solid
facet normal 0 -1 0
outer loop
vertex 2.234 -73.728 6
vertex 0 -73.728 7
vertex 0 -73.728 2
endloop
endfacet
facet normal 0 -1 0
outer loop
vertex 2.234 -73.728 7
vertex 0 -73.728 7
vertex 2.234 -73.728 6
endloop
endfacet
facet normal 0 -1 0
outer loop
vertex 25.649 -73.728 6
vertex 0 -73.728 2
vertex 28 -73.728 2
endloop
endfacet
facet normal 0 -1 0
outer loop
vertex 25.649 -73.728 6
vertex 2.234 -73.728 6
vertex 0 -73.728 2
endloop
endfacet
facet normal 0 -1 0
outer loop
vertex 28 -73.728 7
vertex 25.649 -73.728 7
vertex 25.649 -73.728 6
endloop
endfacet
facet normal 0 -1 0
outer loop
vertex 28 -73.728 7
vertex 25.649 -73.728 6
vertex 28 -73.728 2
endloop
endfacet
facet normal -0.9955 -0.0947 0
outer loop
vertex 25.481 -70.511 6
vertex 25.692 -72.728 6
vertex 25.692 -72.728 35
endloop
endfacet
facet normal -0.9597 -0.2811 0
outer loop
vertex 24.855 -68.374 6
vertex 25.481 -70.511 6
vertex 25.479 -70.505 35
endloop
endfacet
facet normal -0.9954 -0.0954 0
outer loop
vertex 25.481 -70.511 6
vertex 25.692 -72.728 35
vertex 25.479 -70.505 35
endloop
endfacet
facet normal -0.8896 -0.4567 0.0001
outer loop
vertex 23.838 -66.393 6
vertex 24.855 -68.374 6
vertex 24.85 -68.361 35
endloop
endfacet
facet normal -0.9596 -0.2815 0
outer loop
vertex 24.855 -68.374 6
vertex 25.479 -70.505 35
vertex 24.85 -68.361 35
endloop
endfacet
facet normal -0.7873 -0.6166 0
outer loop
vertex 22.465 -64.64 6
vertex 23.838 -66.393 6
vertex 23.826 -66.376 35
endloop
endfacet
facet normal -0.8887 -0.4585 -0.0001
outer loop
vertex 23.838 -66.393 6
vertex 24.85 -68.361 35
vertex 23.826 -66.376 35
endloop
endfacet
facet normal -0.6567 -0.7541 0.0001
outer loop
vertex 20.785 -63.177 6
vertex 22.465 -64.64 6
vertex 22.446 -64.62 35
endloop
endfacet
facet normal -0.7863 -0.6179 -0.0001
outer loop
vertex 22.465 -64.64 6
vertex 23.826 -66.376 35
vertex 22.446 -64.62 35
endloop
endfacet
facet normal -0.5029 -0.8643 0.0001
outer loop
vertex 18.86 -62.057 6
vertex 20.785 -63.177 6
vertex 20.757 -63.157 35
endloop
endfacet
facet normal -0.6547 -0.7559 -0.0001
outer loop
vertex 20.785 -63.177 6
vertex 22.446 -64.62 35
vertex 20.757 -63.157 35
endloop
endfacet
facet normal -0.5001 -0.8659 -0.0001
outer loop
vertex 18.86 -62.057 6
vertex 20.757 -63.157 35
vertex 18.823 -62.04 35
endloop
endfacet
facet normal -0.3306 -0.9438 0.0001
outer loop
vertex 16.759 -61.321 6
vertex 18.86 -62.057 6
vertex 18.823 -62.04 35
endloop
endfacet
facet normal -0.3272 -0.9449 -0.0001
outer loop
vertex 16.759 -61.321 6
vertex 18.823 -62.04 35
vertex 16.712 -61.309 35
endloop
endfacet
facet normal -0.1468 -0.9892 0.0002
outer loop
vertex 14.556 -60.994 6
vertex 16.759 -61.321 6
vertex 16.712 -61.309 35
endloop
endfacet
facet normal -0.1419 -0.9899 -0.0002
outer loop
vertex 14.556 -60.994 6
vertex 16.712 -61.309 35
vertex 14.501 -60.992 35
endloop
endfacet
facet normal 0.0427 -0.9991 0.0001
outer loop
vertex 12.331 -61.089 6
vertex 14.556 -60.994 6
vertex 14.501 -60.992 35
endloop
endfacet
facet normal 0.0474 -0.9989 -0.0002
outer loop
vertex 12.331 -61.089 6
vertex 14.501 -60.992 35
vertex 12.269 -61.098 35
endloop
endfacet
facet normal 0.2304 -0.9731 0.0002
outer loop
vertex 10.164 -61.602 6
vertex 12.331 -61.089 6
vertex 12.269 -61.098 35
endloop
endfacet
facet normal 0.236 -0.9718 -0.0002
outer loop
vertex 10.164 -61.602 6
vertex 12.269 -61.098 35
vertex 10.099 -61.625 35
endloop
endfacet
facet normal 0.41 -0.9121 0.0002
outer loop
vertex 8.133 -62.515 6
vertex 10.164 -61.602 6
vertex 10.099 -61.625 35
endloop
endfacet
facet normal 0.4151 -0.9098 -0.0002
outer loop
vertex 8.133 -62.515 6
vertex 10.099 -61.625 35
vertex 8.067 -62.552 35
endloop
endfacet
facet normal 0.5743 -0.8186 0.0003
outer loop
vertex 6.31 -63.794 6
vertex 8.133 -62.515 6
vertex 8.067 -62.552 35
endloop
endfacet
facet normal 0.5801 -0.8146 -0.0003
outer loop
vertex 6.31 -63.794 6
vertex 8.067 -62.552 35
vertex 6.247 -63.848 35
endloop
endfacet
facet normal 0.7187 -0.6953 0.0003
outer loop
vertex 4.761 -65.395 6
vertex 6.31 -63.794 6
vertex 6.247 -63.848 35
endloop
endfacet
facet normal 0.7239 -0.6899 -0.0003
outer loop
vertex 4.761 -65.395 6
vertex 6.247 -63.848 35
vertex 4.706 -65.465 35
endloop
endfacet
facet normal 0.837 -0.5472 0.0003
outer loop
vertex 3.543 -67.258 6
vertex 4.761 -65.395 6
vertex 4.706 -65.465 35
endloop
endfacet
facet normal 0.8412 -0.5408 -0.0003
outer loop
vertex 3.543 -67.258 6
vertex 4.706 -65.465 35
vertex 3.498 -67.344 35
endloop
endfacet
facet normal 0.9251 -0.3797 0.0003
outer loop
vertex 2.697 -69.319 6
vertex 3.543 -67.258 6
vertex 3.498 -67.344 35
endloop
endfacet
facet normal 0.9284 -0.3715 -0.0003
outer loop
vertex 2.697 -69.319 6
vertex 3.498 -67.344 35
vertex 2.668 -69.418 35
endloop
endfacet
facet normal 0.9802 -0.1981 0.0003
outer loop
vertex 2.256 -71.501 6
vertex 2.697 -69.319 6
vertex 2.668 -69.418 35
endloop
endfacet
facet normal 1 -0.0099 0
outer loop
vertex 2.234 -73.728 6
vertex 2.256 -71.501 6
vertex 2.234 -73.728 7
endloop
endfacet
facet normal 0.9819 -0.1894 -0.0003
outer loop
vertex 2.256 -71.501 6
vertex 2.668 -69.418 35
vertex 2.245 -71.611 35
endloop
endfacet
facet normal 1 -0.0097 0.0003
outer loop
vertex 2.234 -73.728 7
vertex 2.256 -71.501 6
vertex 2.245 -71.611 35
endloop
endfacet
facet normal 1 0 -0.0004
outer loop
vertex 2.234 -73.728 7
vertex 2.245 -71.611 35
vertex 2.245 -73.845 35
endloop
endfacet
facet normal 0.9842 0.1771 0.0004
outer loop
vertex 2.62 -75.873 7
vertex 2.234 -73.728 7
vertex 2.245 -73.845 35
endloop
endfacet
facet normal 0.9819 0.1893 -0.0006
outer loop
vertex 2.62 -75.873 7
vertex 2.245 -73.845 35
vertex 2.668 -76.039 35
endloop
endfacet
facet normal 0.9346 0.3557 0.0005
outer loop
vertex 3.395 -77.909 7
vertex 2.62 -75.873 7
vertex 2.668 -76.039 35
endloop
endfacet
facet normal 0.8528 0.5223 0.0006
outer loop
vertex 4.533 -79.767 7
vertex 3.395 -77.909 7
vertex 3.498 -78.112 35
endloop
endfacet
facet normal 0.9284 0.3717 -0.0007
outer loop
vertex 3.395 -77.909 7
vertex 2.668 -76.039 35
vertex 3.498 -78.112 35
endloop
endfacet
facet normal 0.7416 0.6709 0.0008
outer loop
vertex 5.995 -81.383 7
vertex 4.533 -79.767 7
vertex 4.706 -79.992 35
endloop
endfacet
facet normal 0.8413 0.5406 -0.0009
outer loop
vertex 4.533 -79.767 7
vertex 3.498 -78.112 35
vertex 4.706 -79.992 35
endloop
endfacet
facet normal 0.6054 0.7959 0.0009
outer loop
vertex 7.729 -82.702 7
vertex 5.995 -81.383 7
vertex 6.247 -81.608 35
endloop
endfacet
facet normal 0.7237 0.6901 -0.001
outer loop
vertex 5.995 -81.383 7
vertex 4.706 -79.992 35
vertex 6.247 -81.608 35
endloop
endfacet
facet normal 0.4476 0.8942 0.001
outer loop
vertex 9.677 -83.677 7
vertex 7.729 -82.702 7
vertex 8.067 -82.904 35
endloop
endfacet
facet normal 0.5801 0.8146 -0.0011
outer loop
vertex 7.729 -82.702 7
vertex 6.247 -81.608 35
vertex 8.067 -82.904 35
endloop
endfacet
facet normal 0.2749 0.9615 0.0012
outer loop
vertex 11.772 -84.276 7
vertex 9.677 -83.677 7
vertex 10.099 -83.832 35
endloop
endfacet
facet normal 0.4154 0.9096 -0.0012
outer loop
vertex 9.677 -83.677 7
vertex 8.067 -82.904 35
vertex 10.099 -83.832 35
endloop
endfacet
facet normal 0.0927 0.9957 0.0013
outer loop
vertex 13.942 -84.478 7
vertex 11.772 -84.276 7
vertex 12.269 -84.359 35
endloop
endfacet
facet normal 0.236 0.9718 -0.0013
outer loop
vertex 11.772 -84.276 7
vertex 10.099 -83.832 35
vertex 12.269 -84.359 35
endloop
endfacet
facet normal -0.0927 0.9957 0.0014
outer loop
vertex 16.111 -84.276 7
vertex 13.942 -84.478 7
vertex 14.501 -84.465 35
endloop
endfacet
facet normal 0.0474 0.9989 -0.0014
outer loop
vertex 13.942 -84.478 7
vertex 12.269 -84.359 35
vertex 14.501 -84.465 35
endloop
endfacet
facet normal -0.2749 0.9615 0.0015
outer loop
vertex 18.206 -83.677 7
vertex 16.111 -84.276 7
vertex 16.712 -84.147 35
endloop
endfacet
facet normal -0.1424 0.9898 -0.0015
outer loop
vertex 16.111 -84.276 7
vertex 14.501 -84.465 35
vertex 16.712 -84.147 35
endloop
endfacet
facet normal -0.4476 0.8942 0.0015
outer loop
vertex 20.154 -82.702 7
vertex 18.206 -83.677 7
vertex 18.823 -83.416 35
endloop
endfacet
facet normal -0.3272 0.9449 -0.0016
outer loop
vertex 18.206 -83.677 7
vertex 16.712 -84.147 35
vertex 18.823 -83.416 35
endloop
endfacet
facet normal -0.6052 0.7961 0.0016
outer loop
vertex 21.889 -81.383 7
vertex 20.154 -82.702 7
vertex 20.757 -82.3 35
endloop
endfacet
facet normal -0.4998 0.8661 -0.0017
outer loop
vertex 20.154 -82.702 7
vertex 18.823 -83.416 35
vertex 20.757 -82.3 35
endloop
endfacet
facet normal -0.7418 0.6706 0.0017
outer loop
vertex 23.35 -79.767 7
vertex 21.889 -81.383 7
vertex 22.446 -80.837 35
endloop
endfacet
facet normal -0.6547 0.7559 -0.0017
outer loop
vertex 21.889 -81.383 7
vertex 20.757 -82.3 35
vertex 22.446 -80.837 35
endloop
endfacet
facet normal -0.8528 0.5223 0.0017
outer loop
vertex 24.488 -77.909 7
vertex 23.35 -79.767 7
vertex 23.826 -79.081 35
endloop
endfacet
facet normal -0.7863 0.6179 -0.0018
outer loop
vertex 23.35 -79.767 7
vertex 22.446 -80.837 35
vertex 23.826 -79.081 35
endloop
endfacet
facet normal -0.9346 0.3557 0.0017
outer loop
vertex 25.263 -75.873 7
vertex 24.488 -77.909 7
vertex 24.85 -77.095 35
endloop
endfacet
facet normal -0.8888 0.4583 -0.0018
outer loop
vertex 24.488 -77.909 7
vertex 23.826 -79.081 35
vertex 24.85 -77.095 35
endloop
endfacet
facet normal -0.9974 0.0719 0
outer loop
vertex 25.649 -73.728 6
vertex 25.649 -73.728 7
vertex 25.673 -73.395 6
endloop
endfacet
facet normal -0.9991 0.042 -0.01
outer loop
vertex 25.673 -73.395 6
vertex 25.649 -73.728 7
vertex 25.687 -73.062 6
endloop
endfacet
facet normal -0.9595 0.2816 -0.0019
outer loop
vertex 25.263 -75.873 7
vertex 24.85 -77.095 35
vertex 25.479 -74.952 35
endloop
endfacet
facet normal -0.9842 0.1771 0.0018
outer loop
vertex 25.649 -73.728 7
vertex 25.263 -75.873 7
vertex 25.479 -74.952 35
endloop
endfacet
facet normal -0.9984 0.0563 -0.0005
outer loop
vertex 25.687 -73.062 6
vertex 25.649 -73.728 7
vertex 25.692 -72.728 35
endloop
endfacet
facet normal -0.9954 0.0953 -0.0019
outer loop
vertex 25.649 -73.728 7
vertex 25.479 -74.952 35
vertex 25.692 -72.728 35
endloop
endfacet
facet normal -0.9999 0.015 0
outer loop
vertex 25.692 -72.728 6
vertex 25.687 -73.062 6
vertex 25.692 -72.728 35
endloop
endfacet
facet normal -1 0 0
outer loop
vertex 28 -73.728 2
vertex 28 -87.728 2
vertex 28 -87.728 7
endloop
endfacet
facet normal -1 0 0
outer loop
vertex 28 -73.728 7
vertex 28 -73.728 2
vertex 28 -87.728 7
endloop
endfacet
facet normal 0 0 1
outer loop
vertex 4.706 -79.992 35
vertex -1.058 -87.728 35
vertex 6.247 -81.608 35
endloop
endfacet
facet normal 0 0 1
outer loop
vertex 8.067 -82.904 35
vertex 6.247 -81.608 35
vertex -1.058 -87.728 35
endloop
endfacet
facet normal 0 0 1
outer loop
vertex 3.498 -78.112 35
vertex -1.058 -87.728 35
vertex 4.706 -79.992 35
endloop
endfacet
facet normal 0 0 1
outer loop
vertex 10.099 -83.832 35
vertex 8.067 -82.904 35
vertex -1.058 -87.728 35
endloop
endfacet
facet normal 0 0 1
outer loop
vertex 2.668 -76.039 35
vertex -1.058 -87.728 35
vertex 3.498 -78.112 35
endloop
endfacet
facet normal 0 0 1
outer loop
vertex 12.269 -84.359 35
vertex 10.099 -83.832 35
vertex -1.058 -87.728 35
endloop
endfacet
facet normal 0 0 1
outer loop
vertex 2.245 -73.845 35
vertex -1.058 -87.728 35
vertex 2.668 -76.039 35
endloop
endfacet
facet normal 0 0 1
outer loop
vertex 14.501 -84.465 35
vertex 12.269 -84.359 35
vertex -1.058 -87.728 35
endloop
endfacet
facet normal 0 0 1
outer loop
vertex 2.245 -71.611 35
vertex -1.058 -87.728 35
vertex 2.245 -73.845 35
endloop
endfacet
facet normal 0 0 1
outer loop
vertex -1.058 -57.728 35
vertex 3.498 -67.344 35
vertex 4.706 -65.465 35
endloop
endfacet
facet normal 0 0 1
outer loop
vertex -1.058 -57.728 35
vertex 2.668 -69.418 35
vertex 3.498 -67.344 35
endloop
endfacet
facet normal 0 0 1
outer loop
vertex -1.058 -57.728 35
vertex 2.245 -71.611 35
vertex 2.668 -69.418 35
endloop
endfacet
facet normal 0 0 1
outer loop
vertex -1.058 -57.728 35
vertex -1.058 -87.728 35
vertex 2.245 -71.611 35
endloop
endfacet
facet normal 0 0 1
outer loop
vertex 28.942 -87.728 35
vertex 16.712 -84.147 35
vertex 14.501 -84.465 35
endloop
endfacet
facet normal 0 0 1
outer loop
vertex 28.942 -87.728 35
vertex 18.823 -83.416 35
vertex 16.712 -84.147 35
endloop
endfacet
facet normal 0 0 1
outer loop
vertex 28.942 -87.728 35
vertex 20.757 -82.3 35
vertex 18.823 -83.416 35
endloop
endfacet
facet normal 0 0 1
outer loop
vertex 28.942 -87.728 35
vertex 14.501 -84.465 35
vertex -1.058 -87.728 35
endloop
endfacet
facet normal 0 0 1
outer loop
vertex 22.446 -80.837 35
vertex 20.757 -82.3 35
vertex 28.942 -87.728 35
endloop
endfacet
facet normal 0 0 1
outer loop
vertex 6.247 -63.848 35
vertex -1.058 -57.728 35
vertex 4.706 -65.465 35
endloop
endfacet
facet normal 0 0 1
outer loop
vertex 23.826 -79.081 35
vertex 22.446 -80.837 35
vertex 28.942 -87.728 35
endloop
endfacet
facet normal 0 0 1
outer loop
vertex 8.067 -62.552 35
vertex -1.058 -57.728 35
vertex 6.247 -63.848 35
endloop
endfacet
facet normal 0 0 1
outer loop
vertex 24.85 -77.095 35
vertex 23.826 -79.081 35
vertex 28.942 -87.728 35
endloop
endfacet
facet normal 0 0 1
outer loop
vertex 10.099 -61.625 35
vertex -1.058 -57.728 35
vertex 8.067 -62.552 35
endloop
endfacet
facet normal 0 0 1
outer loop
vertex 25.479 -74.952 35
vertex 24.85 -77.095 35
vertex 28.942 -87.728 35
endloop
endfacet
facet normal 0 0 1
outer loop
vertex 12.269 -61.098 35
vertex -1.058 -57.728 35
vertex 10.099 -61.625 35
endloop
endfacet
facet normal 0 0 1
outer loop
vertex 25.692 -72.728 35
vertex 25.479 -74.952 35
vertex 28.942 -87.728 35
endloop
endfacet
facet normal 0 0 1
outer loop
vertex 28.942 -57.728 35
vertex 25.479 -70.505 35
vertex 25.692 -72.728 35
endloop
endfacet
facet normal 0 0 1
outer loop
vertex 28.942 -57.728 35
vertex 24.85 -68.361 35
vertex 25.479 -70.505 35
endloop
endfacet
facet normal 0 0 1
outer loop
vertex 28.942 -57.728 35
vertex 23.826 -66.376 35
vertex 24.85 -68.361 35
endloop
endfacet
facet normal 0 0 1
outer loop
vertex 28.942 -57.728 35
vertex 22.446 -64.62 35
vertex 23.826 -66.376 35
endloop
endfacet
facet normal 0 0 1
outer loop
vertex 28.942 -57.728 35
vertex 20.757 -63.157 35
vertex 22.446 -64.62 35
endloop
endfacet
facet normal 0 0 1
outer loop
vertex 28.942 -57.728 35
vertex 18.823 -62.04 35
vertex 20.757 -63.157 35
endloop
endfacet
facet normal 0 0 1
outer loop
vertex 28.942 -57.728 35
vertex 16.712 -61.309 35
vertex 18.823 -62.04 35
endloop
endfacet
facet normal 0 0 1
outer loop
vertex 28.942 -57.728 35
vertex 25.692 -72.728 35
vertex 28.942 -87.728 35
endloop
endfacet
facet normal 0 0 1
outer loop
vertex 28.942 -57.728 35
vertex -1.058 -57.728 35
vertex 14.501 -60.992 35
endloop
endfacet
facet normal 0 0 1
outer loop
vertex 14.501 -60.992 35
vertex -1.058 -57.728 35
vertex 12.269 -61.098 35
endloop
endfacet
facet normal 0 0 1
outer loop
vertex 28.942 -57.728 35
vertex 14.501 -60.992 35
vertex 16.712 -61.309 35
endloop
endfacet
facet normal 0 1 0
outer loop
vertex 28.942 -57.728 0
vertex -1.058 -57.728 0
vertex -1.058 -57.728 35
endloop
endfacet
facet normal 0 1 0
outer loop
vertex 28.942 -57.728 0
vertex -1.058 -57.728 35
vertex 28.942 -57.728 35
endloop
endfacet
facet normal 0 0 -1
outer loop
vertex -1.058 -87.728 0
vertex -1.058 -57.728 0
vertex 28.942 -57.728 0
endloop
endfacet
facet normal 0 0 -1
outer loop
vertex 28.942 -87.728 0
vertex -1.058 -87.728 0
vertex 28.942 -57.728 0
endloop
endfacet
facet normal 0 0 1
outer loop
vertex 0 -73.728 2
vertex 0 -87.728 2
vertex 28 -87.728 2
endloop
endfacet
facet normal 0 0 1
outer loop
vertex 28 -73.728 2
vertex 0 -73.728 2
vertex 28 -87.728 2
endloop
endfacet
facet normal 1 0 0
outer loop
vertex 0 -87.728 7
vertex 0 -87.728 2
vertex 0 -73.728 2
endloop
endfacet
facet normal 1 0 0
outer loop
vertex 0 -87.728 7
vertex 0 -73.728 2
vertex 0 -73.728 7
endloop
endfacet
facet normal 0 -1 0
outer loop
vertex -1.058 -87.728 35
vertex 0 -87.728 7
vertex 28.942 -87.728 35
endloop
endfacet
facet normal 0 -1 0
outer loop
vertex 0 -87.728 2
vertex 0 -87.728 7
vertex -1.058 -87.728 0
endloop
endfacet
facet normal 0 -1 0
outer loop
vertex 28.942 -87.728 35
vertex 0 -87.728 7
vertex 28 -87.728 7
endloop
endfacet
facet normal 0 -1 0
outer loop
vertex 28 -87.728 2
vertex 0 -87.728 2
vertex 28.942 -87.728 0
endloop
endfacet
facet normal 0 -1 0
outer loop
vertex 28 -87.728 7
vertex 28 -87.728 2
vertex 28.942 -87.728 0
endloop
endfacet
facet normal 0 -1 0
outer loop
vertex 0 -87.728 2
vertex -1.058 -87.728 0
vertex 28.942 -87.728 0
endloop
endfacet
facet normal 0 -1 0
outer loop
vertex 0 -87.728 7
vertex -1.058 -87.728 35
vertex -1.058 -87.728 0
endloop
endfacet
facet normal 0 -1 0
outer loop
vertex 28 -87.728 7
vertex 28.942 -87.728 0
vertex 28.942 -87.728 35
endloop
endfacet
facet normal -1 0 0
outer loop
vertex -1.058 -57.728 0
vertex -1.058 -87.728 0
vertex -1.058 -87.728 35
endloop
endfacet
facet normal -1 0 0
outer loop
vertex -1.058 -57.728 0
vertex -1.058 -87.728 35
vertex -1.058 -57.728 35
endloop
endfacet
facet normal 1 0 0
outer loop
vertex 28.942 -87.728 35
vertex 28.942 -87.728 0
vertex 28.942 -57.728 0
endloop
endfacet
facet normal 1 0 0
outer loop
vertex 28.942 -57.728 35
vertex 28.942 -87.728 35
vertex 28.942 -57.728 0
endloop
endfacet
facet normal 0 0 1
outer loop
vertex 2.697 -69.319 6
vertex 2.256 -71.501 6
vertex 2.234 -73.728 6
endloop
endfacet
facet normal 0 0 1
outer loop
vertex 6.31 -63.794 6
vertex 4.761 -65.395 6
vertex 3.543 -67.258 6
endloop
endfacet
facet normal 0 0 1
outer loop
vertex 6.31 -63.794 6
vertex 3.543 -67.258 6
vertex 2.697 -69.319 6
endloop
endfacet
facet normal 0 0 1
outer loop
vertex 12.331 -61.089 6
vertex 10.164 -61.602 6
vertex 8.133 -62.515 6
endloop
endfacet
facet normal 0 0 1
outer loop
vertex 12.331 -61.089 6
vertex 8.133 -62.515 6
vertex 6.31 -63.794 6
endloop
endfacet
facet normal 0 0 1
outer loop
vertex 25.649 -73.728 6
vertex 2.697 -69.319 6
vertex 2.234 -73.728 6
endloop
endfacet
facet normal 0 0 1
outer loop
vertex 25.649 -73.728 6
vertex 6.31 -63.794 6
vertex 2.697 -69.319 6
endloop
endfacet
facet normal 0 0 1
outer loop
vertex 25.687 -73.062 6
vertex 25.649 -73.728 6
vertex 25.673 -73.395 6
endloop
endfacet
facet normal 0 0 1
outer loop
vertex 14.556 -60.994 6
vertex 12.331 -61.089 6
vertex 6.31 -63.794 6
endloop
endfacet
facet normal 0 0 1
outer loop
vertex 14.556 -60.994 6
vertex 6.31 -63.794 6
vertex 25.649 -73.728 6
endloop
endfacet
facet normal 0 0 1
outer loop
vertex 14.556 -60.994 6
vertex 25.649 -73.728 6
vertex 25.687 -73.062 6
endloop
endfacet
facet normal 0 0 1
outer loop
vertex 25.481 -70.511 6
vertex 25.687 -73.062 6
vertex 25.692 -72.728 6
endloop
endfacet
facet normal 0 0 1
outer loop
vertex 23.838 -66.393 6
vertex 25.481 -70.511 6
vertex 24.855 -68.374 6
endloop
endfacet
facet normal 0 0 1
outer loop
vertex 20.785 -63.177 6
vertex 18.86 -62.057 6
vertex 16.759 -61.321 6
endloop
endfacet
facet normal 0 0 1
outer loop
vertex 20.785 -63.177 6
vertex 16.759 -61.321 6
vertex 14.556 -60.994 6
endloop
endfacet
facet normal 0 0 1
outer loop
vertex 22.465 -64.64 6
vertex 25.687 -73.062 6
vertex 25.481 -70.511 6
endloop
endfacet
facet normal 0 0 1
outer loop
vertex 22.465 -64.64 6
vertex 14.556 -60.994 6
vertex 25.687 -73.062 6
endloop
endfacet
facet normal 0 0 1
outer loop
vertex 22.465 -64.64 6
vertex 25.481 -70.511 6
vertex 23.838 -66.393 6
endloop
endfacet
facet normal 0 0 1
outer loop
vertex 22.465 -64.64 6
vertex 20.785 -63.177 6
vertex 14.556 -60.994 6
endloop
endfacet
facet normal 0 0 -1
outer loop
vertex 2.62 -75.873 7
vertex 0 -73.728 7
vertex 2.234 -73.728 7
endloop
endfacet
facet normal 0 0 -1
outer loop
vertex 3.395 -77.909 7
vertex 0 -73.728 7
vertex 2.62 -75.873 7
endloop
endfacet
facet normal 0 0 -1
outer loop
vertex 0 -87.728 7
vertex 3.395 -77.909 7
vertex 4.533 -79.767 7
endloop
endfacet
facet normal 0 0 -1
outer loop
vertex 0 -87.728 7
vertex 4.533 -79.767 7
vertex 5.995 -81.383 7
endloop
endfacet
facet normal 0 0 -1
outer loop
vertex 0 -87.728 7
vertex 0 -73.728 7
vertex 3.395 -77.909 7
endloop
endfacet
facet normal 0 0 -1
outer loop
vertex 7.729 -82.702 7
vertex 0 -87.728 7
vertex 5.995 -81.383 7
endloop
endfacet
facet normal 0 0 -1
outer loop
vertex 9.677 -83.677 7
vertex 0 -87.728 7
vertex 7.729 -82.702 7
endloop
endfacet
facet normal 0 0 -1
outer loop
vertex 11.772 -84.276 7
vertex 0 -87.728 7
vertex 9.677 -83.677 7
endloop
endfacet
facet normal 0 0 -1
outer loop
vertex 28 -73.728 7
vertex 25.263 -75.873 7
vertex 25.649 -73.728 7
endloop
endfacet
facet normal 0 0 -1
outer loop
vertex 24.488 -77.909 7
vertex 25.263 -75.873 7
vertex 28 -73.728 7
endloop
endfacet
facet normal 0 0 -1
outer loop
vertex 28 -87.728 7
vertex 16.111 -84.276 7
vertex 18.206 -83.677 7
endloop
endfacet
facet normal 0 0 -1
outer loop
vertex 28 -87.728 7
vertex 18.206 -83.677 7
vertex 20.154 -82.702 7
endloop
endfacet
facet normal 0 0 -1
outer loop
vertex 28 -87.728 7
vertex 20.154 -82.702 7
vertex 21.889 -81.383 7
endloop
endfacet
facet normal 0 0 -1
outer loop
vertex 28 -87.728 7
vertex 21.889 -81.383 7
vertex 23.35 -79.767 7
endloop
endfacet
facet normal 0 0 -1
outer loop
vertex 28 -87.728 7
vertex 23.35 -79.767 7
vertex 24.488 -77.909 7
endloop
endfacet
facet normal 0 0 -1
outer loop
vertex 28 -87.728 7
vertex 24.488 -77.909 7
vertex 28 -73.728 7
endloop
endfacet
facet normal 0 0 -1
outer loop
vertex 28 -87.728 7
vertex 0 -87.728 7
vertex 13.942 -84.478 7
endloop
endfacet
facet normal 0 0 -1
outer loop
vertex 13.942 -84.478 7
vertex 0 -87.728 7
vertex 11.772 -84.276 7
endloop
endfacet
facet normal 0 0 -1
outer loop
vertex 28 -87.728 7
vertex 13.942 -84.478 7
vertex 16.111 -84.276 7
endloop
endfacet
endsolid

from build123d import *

# Parameters (mm, degrees)
F0_W     = 30
F0_H     = 30
F1_DEPTH = 35
F2_R     = 11.75
F3_DEPTH = 29
F4_W     = 28
F4_H     = 5
F5_DEPTH = 14


with BuildPart() as f1:
    # F0 (on Top) → F1 (new body)
    with BuildSketch(Plane.XY):
        with Locations((13.941668, -72.72828)):
            Rectangle(F0_W, F0_H)
    extrude(amount=F1_DEPTH)

    # F2 (on face) → F3 (cut)
    with BuildSketch(Plane.XY.offset(35)):
        with Locations((13.941668, -72.72828)):
            Circle(F2_R)
    extrude(amount=-F3_DEPTH, mode=Mode.SUBTRACT)

    # F4 (on face) → F5 (cut)
    with BuildSketch(Plane.XZ.offset(87.72828)):
        with Locations((14, 4.5)):
            Rectangle(F4_W, F4_H)
    extrude(amount=-F5_DEPTH, mode=Mode.SUBTRACT)


solid = f1.part
